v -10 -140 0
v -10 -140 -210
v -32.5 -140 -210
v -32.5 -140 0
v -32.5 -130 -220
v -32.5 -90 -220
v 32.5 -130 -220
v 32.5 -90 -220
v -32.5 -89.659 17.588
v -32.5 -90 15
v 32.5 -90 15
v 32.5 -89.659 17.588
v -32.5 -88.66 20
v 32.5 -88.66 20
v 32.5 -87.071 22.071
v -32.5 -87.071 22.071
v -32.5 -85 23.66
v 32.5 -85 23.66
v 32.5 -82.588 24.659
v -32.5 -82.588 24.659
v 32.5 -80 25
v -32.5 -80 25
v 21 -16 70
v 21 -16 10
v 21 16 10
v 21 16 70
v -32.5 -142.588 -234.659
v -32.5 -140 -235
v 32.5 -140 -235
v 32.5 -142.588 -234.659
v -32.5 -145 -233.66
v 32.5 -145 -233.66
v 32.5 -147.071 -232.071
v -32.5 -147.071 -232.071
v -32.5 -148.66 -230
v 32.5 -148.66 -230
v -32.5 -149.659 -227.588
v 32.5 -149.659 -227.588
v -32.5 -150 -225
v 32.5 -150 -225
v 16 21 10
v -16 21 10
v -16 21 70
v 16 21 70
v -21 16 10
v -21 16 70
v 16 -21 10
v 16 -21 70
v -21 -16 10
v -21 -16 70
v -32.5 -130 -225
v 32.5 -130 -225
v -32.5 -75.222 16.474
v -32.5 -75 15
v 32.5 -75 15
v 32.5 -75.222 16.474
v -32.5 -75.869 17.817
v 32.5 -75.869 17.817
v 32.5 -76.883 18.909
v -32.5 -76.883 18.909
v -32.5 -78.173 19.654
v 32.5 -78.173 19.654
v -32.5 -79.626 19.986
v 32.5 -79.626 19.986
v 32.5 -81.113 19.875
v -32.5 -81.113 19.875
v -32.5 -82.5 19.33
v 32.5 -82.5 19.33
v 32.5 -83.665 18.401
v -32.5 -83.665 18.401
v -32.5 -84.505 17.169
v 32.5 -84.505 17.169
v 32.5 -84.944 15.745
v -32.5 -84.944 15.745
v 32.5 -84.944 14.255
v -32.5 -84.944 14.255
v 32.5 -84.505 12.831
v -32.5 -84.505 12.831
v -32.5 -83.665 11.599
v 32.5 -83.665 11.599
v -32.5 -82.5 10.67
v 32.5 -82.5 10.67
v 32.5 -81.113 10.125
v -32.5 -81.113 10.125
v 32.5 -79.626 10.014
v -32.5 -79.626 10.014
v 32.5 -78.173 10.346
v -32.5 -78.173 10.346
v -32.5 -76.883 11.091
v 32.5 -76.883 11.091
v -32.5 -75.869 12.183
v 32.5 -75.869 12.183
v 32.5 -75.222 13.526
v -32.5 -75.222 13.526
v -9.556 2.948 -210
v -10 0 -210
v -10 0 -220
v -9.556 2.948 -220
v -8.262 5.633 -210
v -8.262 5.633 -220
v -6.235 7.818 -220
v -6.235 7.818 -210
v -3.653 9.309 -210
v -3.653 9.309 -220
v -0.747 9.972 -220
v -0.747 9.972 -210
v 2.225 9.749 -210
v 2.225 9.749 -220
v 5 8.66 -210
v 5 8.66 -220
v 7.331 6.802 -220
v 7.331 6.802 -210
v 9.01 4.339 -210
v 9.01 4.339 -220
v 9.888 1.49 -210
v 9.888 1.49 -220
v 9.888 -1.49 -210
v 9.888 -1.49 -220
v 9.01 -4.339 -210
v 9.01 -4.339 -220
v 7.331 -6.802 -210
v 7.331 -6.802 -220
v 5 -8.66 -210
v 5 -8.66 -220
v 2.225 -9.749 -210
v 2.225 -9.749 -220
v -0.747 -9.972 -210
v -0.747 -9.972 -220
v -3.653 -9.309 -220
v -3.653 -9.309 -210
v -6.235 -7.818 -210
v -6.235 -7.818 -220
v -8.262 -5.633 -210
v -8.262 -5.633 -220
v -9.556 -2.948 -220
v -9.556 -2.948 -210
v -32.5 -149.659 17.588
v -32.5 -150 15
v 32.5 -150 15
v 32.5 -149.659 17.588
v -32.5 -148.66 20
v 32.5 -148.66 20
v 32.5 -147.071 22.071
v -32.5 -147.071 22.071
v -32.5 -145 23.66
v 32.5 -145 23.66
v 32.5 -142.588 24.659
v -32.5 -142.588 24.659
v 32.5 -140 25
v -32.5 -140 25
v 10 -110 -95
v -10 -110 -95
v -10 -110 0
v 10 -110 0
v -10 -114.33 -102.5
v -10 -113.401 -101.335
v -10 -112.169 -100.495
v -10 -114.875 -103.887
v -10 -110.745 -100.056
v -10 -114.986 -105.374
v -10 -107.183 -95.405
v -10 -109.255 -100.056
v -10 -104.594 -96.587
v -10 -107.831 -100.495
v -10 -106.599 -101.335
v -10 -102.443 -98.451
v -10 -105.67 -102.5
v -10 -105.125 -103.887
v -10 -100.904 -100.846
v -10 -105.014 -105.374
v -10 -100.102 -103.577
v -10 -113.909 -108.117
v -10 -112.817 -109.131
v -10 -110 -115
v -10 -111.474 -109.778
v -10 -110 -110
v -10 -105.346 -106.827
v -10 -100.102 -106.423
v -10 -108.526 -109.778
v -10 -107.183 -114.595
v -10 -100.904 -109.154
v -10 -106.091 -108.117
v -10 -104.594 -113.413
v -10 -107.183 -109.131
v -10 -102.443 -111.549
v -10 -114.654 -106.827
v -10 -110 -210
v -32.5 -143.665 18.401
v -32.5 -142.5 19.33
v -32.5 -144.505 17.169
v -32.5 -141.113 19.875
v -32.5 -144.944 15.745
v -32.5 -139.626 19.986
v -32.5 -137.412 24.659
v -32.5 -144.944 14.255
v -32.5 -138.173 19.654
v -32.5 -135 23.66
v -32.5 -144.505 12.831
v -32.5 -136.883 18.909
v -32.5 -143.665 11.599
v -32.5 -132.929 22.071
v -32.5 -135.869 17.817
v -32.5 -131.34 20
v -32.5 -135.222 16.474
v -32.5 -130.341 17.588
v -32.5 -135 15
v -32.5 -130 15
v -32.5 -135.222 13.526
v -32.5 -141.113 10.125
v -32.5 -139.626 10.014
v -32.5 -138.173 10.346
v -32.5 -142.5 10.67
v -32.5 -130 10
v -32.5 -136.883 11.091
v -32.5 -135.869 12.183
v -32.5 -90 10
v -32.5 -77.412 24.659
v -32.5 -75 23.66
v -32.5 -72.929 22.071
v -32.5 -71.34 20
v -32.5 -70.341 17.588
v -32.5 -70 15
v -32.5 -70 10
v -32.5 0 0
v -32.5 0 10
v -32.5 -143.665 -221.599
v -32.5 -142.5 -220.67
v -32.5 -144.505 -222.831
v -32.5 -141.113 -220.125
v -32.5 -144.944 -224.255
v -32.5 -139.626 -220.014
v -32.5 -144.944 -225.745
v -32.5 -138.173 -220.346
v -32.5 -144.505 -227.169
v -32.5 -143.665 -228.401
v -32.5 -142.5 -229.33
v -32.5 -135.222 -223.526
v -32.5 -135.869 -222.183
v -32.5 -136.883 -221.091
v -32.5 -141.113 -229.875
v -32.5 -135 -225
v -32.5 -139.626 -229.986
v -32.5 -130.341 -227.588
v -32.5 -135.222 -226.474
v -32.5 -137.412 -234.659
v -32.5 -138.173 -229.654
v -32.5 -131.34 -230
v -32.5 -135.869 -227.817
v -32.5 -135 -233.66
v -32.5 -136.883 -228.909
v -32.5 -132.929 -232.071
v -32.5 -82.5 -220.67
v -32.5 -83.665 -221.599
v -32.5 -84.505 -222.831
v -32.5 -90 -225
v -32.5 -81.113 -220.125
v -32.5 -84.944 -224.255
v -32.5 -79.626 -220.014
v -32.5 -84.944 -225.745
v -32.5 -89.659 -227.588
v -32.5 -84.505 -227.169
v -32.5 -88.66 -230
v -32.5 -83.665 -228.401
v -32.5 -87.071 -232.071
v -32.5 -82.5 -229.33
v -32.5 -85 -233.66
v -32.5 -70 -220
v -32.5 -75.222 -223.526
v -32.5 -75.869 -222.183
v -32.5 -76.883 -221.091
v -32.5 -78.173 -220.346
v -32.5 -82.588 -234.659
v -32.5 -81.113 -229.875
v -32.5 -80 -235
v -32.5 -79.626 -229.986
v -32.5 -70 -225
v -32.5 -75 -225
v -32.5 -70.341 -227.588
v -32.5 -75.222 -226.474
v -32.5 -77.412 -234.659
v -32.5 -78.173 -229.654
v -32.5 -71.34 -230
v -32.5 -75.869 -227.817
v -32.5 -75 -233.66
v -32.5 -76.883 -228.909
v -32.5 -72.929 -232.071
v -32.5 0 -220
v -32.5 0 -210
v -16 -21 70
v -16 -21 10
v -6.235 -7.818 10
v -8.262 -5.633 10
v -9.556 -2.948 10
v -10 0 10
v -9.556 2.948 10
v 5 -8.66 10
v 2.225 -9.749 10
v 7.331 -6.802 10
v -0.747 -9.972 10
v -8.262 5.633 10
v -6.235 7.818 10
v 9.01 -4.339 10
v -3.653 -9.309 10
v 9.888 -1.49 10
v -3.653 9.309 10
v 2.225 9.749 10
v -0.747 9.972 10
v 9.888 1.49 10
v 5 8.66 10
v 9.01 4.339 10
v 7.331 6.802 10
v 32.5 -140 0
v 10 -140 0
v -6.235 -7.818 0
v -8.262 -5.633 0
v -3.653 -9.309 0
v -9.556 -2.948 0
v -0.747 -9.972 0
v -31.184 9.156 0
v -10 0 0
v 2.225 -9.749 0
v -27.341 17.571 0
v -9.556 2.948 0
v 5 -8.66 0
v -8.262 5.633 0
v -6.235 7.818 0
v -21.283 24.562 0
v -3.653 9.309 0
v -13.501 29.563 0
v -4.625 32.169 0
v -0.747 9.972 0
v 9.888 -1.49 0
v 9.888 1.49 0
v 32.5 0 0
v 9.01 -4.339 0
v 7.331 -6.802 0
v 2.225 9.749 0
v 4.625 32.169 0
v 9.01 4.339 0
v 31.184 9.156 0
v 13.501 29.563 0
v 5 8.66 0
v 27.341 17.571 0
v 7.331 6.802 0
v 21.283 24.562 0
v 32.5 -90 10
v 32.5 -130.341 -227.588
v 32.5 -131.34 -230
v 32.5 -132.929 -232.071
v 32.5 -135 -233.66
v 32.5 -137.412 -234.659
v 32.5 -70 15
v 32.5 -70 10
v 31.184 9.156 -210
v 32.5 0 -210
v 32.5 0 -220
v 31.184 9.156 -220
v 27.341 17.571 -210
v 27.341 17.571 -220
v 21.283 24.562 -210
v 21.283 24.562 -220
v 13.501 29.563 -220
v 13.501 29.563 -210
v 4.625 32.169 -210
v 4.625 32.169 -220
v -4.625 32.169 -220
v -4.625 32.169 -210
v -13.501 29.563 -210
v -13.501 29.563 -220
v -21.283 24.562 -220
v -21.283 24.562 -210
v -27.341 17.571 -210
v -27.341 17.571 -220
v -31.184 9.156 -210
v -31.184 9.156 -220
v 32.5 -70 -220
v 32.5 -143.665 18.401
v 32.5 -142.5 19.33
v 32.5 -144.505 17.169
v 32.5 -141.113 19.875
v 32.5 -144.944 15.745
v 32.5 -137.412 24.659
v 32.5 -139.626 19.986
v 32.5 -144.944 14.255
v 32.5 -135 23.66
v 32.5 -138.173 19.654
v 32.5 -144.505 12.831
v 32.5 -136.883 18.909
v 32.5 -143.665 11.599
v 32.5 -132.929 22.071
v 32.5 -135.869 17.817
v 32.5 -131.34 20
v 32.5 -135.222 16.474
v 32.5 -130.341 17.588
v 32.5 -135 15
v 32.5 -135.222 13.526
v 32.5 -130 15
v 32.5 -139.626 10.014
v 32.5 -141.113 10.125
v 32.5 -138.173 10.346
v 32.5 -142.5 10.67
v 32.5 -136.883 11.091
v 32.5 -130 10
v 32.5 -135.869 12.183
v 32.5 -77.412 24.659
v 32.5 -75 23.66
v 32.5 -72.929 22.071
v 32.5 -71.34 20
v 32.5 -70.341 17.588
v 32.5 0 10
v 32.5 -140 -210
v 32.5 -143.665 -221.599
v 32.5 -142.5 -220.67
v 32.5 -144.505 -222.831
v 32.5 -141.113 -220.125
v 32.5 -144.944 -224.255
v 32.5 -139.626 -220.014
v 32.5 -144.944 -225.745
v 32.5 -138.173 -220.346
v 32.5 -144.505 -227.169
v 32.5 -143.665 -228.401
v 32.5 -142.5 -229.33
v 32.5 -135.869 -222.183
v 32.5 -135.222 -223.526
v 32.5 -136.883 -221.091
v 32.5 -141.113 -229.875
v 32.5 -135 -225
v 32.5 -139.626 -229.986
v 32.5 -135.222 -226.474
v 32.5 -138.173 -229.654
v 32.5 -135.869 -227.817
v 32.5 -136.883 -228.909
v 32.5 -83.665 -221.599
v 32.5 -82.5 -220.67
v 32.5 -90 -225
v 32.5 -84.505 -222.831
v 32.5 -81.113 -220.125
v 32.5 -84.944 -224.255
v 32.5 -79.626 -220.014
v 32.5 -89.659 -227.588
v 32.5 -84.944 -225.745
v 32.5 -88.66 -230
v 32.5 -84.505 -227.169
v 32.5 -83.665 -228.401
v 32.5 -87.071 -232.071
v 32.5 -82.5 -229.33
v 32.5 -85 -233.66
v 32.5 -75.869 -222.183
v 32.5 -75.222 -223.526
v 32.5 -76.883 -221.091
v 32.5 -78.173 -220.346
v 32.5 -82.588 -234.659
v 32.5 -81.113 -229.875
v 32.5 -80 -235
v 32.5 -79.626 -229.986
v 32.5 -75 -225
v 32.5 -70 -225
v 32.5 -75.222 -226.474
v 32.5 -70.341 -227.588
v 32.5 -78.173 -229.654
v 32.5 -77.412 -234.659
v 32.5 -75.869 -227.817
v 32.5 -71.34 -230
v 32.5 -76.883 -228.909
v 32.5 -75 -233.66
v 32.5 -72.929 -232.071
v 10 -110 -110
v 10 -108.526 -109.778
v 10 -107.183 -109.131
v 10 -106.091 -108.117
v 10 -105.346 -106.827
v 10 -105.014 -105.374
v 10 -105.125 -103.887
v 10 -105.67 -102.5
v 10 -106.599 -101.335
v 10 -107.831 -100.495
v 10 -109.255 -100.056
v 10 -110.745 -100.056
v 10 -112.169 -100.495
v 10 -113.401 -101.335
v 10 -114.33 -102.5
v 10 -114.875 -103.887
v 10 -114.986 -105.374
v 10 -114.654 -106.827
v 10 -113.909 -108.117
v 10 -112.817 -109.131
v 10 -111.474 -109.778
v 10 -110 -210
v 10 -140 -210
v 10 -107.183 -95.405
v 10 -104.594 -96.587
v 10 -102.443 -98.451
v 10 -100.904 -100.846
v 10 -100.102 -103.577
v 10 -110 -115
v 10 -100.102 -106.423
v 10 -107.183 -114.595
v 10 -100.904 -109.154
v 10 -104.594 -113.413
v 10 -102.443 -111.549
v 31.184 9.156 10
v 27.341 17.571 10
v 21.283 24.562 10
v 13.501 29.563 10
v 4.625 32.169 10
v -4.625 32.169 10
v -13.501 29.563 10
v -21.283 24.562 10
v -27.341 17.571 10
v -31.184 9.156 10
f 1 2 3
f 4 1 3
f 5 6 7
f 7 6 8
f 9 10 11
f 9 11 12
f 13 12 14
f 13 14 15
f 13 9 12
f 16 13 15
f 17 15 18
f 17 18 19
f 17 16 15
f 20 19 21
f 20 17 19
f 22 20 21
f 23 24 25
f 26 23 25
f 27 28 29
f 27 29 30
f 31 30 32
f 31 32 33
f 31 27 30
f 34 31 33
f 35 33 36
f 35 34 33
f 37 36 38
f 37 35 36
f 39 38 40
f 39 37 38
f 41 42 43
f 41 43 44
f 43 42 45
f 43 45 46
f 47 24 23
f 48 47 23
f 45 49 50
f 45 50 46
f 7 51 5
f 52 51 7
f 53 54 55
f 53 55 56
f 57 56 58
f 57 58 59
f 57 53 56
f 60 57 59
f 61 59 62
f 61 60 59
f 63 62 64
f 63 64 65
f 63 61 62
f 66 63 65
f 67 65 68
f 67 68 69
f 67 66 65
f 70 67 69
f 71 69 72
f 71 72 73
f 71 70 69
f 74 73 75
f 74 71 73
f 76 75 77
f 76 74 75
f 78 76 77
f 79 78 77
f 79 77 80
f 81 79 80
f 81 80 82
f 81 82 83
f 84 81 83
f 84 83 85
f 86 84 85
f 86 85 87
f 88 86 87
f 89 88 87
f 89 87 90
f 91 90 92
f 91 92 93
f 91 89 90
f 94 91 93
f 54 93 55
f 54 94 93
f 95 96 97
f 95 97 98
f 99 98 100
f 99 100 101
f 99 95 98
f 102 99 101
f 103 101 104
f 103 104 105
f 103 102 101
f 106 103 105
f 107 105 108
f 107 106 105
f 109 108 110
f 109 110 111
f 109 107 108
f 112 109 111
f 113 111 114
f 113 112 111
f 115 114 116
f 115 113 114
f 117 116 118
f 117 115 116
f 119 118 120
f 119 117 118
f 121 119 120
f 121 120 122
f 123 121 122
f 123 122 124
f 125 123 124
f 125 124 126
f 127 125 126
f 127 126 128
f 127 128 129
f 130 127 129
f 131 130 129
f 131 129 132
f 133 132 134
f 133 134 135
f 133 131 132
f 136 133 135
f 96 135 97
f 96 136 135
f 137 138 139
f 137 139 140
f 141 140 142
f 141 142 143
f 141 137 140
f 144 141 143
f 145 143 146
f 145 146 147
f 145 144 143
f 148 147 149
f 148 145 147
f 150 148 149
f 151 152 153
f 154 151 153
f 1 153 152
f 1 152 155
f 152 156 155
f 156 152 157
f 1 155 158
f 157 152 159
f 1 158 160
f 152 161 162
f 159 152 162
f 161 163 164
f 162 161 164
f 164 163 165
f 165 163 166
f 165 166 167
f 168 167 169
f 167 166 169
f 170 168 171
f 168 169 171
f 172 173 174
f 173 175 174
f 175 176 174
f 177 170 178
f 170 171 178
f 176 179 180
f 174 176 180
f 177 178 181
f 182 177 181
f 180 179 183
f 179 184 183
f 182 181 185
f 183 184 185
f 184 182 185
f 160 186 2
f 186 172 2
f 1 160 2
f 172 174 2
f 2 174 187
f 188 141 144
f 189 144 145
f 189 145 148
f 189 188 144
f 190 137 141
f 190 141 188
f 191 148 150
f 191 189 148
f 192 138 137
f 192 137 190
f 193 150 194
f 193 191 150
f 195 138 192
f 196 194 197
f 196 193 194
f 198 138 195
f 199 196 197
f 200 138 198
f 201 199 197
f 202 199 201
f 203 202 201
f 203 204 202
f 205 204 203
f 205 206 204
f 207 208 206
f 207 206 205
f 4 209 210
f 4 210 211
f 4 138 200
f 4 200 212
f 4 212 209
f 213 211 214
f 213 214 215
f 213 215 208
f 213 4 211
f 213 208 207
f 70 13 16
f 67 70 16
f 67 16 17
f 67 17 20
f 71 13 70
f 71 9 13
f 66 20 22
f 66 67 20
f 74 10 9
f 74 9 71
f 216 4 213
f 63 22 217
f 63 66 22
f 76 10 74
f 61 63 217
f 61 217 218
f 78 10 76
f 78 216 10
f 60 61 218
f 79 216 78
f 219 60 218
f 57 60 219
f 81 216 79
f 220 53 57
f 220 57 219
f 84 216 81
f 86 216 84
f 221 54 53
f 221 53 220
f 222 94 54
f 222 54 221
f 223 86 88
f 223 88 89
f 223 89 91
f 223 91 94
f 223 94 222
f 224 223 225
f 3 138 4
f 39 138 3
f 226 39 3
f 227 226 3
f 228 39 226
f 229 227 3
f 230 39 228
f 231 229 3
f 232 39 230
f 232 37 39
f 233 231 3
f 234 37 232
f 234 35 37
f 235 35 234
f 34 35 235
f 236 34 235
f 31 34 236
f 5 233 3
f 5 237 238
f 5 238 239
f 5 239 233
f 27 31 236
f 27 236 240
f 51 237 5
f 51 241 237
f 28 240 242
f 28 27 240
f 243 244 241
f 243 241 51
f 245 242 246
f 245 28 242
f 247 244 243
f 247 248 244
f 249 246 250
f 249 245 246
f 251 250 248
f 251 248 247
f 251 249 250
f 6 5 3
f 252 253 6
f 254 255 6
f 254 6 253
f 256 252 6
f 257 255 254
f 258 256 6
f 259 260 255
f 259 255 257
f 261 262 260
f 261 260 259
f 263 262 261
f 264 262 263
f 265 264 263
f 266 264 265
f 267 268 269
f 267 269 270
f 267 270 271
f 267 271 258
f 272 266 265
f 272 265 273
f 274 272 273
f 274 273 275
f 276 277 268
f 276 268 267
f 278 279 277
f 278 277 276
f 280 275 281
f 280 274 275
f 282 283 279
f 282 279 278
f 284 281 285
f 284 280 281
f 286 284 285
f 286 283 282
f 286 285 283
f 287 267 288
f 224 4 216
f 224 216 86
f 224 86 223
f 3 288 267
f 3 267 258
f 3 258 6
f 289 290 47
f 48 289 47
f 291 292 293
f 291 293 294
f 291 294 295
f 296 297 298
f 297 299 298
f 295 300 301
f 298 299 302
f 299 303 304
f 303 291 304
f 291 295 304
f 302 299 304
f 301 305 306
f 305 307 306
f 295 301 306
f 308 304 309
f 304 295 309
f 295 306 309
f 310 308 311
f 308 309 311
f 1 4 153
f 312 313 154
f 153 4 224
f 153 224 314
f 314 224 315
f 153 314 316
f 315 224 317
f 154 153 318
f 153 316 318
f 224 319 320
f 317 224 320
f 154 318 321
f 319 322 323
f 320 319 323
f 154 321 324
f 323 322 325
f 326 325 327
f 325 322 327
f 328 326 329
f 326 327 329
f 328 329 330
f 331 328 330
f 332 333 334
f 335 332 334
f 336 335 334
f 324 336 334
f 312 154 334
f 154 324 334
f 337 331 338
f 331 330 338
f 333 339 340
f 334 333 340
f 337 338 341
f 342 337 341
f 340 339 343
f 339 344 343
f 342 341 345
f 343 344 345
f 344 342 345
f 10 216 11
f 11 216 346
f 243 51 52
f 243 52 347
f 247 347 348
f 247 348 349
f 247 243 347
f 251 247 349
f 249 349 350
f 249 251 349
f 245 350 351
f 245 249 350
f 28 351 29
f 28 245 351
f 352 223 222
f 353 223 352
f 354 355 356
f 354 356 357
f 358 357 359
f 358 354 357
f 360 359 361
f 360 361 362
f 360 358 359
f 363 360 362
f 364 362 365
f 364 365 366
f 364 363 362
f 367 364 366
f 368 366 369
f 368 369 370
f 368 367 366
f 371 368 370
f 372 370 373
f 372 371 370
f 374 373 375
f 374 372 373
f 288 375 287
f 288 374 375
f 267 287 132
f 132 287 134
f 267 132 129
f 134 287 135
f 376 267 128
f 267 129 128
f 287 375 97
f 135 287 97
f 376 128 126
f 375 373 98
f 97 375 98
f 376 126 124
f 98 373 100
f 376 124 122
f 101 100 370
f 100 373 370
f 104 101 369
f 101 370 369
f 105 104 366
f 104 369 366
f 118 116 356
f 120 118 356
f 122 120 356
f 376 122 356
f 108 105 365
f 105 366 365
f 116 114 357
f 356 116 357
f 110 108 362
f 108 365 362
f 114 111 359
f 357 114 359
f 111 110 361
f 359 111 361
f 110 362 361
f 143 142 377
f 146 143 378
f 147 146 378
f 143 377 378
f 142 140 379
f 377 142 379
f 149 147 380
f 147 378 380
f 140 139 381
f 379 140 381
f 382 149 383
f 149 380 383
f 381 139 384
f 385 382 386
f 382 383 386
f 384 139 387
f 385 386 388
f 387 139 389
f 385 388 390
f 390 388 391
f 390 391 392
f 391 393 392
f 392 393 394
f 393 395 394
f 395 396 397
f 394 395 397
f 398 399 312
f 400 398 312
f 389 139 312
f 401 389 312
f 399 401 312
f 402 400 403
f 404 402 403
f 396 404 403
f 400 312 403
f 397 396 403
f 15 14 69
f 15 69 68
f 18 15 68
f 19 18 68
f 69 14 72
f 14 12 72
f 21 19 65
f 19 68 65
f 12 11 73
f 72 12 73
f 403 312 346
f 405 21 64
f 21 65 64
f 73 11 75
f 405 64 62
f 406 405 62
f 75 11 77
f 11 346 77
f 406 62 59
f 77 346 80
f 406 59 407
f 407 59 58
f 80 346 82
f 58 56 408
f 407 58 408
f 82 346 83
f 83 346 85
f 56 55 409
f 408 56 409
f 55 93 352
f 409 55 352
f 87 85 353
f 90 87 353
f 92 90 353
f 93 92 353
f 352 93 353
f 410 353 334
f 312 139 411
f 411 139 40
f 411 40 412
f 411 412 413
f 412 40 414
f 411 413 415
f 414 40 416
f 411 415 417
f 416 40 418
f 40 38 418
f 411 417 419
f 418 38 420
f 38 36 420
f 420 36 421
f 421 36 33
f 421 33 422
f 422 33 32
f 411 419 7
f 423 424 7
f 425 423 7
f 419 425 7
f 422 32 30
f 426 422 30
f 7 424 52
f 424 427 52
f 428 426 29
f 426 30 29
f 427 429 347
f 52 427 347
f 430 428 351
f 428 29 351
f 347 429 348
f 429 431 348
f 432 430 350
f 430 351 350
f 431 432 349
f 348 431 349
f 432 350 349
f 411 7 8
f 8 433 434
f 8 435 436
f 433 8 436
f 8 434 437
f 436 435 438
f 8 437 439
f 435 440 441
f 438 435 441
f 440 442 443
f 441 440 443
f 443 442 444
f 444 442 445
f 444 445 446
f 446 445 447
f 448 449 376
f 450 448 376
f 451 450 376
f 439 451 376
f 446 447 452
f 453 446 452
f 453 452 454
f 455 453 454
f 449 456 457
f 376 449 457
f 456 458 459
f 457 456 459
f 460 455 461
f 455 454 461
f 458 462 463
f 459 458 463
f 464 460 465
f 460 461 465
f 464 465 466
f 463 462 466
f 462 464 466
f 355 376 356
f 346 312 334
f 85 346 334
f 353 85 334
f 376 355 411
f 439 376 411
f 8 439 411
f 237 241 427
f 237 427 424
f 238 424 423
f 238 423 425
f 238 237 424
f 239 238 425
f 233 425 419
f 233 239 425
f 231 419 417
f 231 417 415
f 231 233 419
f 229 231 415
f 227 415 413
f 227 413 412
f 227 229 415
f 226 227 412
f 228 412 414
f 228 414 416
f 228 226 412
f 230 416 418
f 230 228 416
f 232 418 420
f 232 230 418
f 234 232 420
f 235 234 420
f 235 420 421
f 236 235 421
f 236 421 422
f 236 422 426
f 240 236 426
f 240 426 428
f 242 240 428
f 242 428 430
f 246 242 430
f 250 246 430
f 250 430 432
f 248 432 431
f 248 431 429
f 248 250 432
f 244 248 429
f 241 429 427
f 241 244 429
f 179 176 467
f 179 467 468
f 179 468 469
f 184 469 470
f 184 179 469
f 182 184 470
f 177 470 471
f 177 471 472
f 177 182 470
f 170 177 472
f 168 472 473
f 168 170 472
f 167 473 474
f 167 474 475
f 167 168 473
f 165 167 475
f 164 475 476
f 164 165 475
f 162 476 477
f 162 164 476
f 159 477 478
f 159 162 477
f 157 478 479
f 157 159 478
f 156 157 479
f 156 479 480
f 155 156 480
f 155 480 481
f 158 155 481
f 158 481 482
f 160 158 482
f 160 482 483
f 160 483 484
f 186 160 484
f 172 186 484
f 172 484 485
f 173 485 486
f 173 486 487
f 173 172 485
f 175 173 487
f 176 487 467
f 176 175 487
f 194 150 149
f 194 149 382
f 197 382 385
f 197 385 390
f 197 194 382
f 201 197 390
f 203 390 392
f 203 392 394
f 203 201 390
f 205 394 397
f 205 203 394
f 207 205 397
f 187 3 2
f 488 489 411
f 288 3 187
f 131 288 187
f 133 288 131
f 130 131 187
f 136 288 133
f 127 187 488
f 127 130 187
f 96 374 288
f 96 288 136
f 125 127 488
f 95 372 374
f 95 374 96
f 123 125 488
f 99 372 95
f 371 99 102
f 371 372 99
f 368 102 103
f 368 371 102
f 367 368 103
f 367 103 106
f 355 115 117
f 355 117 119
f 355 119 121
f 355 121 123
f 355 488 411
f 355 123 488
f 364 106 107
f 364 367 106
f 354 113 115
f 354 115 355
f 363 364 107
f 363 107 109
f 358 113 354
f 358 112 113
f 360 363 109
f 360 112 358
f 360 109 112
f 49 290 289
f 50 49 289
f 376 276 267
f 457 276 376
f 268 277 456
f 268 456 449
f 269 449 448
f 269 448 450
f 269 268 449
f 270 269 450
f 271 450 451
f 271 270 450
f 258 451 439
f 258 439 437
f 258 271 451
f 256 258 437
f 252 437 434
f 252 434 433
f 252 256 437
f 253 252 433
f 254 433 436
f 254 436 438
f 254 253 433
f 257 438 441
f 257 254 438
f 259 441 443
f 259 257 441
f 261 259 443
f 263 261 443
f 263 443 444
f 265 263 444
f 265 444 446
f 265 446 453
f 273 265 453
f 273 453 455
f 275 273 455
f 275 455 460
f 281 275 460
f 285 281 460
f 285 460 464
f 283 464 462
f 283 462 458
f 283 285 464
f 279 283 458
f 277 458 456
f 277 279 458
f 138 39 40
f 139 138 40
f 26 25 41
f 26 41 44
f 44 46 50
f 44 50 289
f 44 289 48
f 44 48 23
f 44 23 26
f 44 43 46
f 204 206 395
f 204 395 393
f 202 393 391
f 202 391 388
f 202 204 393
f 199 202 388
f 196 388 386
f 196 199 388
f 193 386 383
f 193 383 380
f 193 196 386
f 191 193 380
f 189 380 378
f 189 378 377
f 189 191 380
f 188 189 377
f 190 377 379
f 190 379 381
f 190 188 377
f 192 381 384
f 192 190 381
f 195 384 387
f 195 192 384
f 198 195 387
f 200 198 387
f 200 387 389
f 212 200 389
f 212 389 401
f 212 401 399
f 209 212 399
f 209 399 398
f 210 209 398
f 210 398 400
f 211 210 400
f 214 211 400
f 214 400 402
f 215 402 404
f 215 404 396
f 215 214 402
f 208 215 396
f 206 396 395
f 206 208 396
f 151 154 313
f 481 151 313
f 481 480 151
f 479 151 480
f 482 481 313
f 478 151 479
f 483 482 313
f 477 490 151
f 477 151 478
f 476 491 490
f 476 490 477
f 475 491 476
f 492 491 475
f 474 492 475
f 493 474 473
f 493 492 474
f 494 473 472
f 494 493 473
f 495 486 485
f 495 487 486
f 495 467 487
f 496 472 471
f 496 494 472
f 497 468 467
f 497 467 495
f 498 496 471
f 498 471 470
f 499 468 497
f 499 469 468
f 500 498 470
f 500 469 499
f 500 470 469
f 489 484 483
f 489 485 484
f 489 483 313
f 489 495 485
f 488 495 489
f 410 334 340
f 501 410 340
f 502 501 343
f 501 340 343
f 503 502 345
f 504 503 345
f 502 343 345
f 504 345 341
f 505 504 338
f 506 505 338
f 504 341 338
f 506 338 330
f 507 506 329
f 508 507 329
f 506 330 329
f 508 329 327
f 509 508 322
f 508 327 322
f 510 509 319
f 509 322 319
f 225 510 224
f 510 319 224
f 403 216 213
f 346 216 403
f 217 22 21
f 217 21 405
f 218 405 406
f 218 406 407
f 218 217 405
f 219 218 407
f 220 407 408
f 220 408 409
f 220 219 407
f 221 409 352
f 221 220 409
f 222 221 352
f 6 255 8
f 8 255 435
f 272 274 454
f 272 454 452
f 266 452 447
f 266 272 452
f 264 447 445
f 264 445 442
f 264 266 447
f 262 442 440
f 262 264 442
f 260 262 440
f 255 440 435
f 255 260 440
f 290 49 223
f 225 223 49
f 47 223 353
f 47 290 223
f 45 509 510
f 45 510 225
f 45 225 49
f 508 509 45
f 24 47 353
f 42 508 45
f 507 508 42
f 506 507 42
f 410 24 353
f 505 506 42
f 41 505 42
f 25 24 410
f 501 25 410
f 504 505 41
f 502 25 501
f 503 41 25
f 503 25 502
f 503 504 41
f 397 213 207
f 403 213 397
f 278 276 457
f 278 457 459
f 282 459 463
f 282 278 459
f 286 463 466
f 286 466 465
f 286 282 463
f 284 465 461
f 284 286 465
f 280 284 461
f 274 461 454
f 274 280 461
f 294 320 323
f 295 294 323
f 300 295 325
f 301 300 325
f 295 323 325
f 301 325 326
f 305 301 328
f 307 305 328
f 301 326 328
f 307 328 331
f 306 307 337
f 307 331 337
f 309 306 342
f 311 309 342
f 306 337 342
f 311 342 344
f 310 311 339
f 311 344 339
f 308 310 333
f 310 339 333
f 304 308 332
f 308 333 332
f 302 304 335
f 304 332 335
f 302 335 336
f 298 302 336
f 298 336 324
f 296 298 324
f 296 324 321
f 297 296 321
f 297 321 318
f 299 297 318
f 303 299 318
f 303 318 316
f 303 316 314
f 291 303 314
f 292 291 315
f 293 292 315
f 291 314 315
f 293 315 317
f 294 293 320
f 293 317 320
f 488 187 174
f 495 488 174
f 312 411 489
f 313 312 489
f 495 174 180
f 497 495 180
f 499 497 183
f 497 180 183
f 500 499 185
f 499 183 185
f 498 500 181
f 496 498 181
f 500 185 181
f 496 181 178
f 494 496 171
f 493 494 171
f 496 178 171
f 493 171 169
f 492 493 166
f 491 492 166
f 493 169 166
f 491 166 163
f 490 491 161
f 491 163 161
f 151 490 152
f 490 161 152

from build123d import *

# Parameters (mm, degrees)
BOSS_EXTRUDE1_DEPTH       = 10
SKETCH2_W                 = 65
SKETCH2_H                 = 10
BOSS_EXTRUDE2_DEPTH       = 105
SKETCH3_W                 = 42
SKETCH3_H                 = 42
BOSS_EXTRUDE3_DEPTH       = 60
CHAMFER1_SIZE             = 5
BOSS_EXTRUDE6_START       = -235
BOSS_EXTRUDE6_OUTLINE_W   = 65
BOSS_EXTRUDE6_OUTLINE_H   = 20
BOSS_EXTRUDE6_DEPTH       = 15
BOSS_EXTRUDE6_START_2     = 10
BOSS_EXTRUDE6_2_OUTLINE_W = 65
BOSS_EXTRUDE6_2_OUTLINE_H = 20
BOSS_EXTRUDE6_2_DEPTH     = 15
BOSS_EXTRUDE6_START_3     = -32.5
BOSS_EXTRUDE6_3_OUTLINE_R = 5
BOSS_EXTRUDE6_3_DEPTH     = 65
BOSS_EXTRUDE9_DEPTH       = 10
BOSS_EXTRUDE9_DEPTH_BACK  = 10
SKETCH5_R                 = 5


with BuildPart() as part:
    # Sketch1 → Boss-Extrude1 (new body)
    with BuildSketch(Plane.XY):
        with BuildLine():
            Line((32.5, -150), (32.5, 0))
            ThreePointArc((32.5, 0), (0, -32.5), (-32.5, 0))
            Line((-32.5, 0), (-32.5, -150))
            Line((-32.5, -150), (32.5, -150))
        make_face()
        with BuildLine():
            ThreePointArc((-10, 0), (0, 10), (10, 0))
            Line((10, 0), (32.5, 0))
            ThreePointArc((32.5, 0), (0, 32.5), (-32.5, 0))
            Line((-32.5, 0), (-10, 0))
        make_face()
        with BuildLine():
            Line((32.5, 0), (10, 0))
            ThreePointArc((10, 0), (0, -10), (-10, 0))
            Line((-10, 0), (-32.5, 0))
            ThreePointArc((-32.5, 0), (0, -32.5), (32.5, 0))
        make_face()
    extrude(amount=BOSS_EXTRUDE1_DEPTH)

    # Sketch2 → Boss-Extrude2 (add)
    with BuildSketch(Plane(origin=(0, 0, 0), x_dir=(-1, 0, 0), z_dir=(0, 0, -1))):
        with Locations((0, -145)):
            Rectangle(SKETCH2_W, SKETCH2_H)
    extrude(amount=BOSS_EXTRUDE2_DEPTH)

    # Mirror1: part across plane


with BuildPart() as part_1:
    add(part.part)
    add(part.part.mirror(Plane(origin=(0, 0, -105), x_dir=(1, 0, 0), z_dir=(0, 0, -1))))

    # Sketch3 → Boss-Extrude3 (add)
    with BuildSketch(Plane.XY.offset(10)):
        Rectangle(SKETCH3_W, SKETCH3_H)
    extrude(amount=BOSS_EXTRUDE3_DEPTH)

    # Chamfer1
    chamfer1_edges = [part_1.edges().sort_by_distance(p)[0] for p in [
        (-21, 21, 40),
        (-21, -21, 40),
        (21, -21, 40),
        (21, 21, 40),
    ]]
    chamfer(chamfer1_edges, length=CHAMFER1_SIZE)

    # Boss-Extrude6: read off the stored shape, not the designer's step
    # Boss-Extrude6 outline → Boss-Extrude6 (add)
    with BuildSketch(Plane.XY.offset(BOSS_EXTRUDE6_START)):
        with Locations((0, -140)):
            Rectangle(BOSS_EXTRUDE6_OUTLINE_W, BOSS_EXTRUDE6_OUTLINE_H)
        with Locations((0, -80)):
            Rectangle(BOSS_EXTRUDE6_OUTLINE_W, BOSS_EXTRUDE6_OUTLINE_H)
    extrude(amount=BOSS_EXTRUDE6_DEPTH)

    # Boss-Extrude6 2 outline → Boss-Extrude6 2 (add)
    with BuildSketch(Plane.XY.offset(BOSS_EXTRUDE6_START_2)):
        with Locations((0, -140)):
            Rectangle(BOSS_EXTRUDE6_2_OUTLINE_W, BOSS_EXTRUDE6_2_OUTLINE_H)
        with Locations((0, -80)):
            Rectangle(BOSS_EXTRUDE6_2_OUTLINE_W, BOSS_EXTRUDE6_2_OUTLINE_H)
    extrude(amount=BOSS_EXTRUDE6_2_DEPTH)

    # Boss-Extrude6 3 outline → Boss-Extrude6 3 (cut)
    with BuildSketch(Plane.YZ.offset(BOSS_EXTRUDE6_START_3)):
        with BuildLine():
            ThreePointArc((-90, 15), (-87.071067812, 22.071067812), (-80, 25))
            Line((-80, 25), (-90, 25))
            Line((-90, 25), (-90, 15))
        make_face()
        with BuildLine():
            ThreePointArc((-80, 25), (-72.928932188, 22.071067812), (-70, 15))
            Line((-70, 15), (-70, 25))
            Line((-70, 25), (-80, 25))
        make_face()
        with Locations((-80, 15)):
            Circle(BOSS_EXTRUDE6_3_OUTLINE_R)
        with BuildLine():
            ThreePointArc((-130, -225), (-132.928932188, -232.071067812), (-140, -235))
            Line((-140, -235), (-130, -235))
            Line((-130, -235), (-130, -225))
        make_face()
        with BuildLine():
            ThreePointArc((-140, -235), (-147.071067812, -232.071067812), (-150, -225))
            Line((-150, -225), (-150, -235))
            Line((-150, -235), (-140, -235))
        make_face()
        with BuildLine():
            ThreePointArc((-150, 15), (-147.071067812, 22.071067812), (-140, 25))
            Line((-140, 25), (-150, 25))
            Line((-150, 25), (-150, 15))
        make_face()
        with BuildLine():
            ThreePointArc((-140, 25), (-132.928932188, 22.071067812), (-130, 15))
            Line((-130, 15), (-130, 25))
            Line((-130, 25), (-140, 25))
        make_face()
        with Locations((-140, 15)):
            Circle(BOSS_EXTRUDE6_3_OUTLINE_R)
        with BuildLine():
            ThreePointArc((-70, -225), (-72.928932188, -232.071067812), (-80, -235))
            Line((-80, -235), (-70, -235))
            Line((-70, -235), (-70, -225))
        make_face()
        with BuildLine():
            ThreePointArc((-80, -235), (-87.071067812, -232.071067812), (-90, -225))
            Line((-90, -225), (-90, -235))
            Line((-90, -235), (-80, -235))
        make_face()
        with Locations((-80, -225)):
            Circle(BOSS_EXTRUDE6_3_OUTLINE_R)
        with Locations((-140, -225)):
            Circle(BOSS_EXTRUDE6_3_OUTLINE_R)
    extrude(amount=BOSS_EXTRUDE6_3_DEPTH, mode=Mode.SUBTRACT)

    # Sketch5 → Boss-Extrude9 (add, two sides: drawn at the far end of the back side and taken through both)
    with BuildSketch(Plane(origin=(0, 0, 0), x_dir=(0, 0, -1), z_dir=(1, 0, 0)).offset(-BOSS_EXTRUDE9_DEPTH_BACK)):
        with BuildLine():
            Line((95, -110), (0, -110))
            Line((0, -110), (0, -140))
            Line((0, -140), (210, -140))
            Line((210, -140), (210, -110))
            Line((210, -110), (115, -110))
            ThreePointArc((115, -110), (105, -100), (95, -110))
        make_face()
        with Locations((105, -110)):
            Circle(SKETCH5_R, mode=Mode.SUBTRACT)
    extrude(amount=BOSS_EXTRUDE9_DEPTH + BOSS_EXTRUDE9_DEPTH_BACK)


solid = part_1.part
